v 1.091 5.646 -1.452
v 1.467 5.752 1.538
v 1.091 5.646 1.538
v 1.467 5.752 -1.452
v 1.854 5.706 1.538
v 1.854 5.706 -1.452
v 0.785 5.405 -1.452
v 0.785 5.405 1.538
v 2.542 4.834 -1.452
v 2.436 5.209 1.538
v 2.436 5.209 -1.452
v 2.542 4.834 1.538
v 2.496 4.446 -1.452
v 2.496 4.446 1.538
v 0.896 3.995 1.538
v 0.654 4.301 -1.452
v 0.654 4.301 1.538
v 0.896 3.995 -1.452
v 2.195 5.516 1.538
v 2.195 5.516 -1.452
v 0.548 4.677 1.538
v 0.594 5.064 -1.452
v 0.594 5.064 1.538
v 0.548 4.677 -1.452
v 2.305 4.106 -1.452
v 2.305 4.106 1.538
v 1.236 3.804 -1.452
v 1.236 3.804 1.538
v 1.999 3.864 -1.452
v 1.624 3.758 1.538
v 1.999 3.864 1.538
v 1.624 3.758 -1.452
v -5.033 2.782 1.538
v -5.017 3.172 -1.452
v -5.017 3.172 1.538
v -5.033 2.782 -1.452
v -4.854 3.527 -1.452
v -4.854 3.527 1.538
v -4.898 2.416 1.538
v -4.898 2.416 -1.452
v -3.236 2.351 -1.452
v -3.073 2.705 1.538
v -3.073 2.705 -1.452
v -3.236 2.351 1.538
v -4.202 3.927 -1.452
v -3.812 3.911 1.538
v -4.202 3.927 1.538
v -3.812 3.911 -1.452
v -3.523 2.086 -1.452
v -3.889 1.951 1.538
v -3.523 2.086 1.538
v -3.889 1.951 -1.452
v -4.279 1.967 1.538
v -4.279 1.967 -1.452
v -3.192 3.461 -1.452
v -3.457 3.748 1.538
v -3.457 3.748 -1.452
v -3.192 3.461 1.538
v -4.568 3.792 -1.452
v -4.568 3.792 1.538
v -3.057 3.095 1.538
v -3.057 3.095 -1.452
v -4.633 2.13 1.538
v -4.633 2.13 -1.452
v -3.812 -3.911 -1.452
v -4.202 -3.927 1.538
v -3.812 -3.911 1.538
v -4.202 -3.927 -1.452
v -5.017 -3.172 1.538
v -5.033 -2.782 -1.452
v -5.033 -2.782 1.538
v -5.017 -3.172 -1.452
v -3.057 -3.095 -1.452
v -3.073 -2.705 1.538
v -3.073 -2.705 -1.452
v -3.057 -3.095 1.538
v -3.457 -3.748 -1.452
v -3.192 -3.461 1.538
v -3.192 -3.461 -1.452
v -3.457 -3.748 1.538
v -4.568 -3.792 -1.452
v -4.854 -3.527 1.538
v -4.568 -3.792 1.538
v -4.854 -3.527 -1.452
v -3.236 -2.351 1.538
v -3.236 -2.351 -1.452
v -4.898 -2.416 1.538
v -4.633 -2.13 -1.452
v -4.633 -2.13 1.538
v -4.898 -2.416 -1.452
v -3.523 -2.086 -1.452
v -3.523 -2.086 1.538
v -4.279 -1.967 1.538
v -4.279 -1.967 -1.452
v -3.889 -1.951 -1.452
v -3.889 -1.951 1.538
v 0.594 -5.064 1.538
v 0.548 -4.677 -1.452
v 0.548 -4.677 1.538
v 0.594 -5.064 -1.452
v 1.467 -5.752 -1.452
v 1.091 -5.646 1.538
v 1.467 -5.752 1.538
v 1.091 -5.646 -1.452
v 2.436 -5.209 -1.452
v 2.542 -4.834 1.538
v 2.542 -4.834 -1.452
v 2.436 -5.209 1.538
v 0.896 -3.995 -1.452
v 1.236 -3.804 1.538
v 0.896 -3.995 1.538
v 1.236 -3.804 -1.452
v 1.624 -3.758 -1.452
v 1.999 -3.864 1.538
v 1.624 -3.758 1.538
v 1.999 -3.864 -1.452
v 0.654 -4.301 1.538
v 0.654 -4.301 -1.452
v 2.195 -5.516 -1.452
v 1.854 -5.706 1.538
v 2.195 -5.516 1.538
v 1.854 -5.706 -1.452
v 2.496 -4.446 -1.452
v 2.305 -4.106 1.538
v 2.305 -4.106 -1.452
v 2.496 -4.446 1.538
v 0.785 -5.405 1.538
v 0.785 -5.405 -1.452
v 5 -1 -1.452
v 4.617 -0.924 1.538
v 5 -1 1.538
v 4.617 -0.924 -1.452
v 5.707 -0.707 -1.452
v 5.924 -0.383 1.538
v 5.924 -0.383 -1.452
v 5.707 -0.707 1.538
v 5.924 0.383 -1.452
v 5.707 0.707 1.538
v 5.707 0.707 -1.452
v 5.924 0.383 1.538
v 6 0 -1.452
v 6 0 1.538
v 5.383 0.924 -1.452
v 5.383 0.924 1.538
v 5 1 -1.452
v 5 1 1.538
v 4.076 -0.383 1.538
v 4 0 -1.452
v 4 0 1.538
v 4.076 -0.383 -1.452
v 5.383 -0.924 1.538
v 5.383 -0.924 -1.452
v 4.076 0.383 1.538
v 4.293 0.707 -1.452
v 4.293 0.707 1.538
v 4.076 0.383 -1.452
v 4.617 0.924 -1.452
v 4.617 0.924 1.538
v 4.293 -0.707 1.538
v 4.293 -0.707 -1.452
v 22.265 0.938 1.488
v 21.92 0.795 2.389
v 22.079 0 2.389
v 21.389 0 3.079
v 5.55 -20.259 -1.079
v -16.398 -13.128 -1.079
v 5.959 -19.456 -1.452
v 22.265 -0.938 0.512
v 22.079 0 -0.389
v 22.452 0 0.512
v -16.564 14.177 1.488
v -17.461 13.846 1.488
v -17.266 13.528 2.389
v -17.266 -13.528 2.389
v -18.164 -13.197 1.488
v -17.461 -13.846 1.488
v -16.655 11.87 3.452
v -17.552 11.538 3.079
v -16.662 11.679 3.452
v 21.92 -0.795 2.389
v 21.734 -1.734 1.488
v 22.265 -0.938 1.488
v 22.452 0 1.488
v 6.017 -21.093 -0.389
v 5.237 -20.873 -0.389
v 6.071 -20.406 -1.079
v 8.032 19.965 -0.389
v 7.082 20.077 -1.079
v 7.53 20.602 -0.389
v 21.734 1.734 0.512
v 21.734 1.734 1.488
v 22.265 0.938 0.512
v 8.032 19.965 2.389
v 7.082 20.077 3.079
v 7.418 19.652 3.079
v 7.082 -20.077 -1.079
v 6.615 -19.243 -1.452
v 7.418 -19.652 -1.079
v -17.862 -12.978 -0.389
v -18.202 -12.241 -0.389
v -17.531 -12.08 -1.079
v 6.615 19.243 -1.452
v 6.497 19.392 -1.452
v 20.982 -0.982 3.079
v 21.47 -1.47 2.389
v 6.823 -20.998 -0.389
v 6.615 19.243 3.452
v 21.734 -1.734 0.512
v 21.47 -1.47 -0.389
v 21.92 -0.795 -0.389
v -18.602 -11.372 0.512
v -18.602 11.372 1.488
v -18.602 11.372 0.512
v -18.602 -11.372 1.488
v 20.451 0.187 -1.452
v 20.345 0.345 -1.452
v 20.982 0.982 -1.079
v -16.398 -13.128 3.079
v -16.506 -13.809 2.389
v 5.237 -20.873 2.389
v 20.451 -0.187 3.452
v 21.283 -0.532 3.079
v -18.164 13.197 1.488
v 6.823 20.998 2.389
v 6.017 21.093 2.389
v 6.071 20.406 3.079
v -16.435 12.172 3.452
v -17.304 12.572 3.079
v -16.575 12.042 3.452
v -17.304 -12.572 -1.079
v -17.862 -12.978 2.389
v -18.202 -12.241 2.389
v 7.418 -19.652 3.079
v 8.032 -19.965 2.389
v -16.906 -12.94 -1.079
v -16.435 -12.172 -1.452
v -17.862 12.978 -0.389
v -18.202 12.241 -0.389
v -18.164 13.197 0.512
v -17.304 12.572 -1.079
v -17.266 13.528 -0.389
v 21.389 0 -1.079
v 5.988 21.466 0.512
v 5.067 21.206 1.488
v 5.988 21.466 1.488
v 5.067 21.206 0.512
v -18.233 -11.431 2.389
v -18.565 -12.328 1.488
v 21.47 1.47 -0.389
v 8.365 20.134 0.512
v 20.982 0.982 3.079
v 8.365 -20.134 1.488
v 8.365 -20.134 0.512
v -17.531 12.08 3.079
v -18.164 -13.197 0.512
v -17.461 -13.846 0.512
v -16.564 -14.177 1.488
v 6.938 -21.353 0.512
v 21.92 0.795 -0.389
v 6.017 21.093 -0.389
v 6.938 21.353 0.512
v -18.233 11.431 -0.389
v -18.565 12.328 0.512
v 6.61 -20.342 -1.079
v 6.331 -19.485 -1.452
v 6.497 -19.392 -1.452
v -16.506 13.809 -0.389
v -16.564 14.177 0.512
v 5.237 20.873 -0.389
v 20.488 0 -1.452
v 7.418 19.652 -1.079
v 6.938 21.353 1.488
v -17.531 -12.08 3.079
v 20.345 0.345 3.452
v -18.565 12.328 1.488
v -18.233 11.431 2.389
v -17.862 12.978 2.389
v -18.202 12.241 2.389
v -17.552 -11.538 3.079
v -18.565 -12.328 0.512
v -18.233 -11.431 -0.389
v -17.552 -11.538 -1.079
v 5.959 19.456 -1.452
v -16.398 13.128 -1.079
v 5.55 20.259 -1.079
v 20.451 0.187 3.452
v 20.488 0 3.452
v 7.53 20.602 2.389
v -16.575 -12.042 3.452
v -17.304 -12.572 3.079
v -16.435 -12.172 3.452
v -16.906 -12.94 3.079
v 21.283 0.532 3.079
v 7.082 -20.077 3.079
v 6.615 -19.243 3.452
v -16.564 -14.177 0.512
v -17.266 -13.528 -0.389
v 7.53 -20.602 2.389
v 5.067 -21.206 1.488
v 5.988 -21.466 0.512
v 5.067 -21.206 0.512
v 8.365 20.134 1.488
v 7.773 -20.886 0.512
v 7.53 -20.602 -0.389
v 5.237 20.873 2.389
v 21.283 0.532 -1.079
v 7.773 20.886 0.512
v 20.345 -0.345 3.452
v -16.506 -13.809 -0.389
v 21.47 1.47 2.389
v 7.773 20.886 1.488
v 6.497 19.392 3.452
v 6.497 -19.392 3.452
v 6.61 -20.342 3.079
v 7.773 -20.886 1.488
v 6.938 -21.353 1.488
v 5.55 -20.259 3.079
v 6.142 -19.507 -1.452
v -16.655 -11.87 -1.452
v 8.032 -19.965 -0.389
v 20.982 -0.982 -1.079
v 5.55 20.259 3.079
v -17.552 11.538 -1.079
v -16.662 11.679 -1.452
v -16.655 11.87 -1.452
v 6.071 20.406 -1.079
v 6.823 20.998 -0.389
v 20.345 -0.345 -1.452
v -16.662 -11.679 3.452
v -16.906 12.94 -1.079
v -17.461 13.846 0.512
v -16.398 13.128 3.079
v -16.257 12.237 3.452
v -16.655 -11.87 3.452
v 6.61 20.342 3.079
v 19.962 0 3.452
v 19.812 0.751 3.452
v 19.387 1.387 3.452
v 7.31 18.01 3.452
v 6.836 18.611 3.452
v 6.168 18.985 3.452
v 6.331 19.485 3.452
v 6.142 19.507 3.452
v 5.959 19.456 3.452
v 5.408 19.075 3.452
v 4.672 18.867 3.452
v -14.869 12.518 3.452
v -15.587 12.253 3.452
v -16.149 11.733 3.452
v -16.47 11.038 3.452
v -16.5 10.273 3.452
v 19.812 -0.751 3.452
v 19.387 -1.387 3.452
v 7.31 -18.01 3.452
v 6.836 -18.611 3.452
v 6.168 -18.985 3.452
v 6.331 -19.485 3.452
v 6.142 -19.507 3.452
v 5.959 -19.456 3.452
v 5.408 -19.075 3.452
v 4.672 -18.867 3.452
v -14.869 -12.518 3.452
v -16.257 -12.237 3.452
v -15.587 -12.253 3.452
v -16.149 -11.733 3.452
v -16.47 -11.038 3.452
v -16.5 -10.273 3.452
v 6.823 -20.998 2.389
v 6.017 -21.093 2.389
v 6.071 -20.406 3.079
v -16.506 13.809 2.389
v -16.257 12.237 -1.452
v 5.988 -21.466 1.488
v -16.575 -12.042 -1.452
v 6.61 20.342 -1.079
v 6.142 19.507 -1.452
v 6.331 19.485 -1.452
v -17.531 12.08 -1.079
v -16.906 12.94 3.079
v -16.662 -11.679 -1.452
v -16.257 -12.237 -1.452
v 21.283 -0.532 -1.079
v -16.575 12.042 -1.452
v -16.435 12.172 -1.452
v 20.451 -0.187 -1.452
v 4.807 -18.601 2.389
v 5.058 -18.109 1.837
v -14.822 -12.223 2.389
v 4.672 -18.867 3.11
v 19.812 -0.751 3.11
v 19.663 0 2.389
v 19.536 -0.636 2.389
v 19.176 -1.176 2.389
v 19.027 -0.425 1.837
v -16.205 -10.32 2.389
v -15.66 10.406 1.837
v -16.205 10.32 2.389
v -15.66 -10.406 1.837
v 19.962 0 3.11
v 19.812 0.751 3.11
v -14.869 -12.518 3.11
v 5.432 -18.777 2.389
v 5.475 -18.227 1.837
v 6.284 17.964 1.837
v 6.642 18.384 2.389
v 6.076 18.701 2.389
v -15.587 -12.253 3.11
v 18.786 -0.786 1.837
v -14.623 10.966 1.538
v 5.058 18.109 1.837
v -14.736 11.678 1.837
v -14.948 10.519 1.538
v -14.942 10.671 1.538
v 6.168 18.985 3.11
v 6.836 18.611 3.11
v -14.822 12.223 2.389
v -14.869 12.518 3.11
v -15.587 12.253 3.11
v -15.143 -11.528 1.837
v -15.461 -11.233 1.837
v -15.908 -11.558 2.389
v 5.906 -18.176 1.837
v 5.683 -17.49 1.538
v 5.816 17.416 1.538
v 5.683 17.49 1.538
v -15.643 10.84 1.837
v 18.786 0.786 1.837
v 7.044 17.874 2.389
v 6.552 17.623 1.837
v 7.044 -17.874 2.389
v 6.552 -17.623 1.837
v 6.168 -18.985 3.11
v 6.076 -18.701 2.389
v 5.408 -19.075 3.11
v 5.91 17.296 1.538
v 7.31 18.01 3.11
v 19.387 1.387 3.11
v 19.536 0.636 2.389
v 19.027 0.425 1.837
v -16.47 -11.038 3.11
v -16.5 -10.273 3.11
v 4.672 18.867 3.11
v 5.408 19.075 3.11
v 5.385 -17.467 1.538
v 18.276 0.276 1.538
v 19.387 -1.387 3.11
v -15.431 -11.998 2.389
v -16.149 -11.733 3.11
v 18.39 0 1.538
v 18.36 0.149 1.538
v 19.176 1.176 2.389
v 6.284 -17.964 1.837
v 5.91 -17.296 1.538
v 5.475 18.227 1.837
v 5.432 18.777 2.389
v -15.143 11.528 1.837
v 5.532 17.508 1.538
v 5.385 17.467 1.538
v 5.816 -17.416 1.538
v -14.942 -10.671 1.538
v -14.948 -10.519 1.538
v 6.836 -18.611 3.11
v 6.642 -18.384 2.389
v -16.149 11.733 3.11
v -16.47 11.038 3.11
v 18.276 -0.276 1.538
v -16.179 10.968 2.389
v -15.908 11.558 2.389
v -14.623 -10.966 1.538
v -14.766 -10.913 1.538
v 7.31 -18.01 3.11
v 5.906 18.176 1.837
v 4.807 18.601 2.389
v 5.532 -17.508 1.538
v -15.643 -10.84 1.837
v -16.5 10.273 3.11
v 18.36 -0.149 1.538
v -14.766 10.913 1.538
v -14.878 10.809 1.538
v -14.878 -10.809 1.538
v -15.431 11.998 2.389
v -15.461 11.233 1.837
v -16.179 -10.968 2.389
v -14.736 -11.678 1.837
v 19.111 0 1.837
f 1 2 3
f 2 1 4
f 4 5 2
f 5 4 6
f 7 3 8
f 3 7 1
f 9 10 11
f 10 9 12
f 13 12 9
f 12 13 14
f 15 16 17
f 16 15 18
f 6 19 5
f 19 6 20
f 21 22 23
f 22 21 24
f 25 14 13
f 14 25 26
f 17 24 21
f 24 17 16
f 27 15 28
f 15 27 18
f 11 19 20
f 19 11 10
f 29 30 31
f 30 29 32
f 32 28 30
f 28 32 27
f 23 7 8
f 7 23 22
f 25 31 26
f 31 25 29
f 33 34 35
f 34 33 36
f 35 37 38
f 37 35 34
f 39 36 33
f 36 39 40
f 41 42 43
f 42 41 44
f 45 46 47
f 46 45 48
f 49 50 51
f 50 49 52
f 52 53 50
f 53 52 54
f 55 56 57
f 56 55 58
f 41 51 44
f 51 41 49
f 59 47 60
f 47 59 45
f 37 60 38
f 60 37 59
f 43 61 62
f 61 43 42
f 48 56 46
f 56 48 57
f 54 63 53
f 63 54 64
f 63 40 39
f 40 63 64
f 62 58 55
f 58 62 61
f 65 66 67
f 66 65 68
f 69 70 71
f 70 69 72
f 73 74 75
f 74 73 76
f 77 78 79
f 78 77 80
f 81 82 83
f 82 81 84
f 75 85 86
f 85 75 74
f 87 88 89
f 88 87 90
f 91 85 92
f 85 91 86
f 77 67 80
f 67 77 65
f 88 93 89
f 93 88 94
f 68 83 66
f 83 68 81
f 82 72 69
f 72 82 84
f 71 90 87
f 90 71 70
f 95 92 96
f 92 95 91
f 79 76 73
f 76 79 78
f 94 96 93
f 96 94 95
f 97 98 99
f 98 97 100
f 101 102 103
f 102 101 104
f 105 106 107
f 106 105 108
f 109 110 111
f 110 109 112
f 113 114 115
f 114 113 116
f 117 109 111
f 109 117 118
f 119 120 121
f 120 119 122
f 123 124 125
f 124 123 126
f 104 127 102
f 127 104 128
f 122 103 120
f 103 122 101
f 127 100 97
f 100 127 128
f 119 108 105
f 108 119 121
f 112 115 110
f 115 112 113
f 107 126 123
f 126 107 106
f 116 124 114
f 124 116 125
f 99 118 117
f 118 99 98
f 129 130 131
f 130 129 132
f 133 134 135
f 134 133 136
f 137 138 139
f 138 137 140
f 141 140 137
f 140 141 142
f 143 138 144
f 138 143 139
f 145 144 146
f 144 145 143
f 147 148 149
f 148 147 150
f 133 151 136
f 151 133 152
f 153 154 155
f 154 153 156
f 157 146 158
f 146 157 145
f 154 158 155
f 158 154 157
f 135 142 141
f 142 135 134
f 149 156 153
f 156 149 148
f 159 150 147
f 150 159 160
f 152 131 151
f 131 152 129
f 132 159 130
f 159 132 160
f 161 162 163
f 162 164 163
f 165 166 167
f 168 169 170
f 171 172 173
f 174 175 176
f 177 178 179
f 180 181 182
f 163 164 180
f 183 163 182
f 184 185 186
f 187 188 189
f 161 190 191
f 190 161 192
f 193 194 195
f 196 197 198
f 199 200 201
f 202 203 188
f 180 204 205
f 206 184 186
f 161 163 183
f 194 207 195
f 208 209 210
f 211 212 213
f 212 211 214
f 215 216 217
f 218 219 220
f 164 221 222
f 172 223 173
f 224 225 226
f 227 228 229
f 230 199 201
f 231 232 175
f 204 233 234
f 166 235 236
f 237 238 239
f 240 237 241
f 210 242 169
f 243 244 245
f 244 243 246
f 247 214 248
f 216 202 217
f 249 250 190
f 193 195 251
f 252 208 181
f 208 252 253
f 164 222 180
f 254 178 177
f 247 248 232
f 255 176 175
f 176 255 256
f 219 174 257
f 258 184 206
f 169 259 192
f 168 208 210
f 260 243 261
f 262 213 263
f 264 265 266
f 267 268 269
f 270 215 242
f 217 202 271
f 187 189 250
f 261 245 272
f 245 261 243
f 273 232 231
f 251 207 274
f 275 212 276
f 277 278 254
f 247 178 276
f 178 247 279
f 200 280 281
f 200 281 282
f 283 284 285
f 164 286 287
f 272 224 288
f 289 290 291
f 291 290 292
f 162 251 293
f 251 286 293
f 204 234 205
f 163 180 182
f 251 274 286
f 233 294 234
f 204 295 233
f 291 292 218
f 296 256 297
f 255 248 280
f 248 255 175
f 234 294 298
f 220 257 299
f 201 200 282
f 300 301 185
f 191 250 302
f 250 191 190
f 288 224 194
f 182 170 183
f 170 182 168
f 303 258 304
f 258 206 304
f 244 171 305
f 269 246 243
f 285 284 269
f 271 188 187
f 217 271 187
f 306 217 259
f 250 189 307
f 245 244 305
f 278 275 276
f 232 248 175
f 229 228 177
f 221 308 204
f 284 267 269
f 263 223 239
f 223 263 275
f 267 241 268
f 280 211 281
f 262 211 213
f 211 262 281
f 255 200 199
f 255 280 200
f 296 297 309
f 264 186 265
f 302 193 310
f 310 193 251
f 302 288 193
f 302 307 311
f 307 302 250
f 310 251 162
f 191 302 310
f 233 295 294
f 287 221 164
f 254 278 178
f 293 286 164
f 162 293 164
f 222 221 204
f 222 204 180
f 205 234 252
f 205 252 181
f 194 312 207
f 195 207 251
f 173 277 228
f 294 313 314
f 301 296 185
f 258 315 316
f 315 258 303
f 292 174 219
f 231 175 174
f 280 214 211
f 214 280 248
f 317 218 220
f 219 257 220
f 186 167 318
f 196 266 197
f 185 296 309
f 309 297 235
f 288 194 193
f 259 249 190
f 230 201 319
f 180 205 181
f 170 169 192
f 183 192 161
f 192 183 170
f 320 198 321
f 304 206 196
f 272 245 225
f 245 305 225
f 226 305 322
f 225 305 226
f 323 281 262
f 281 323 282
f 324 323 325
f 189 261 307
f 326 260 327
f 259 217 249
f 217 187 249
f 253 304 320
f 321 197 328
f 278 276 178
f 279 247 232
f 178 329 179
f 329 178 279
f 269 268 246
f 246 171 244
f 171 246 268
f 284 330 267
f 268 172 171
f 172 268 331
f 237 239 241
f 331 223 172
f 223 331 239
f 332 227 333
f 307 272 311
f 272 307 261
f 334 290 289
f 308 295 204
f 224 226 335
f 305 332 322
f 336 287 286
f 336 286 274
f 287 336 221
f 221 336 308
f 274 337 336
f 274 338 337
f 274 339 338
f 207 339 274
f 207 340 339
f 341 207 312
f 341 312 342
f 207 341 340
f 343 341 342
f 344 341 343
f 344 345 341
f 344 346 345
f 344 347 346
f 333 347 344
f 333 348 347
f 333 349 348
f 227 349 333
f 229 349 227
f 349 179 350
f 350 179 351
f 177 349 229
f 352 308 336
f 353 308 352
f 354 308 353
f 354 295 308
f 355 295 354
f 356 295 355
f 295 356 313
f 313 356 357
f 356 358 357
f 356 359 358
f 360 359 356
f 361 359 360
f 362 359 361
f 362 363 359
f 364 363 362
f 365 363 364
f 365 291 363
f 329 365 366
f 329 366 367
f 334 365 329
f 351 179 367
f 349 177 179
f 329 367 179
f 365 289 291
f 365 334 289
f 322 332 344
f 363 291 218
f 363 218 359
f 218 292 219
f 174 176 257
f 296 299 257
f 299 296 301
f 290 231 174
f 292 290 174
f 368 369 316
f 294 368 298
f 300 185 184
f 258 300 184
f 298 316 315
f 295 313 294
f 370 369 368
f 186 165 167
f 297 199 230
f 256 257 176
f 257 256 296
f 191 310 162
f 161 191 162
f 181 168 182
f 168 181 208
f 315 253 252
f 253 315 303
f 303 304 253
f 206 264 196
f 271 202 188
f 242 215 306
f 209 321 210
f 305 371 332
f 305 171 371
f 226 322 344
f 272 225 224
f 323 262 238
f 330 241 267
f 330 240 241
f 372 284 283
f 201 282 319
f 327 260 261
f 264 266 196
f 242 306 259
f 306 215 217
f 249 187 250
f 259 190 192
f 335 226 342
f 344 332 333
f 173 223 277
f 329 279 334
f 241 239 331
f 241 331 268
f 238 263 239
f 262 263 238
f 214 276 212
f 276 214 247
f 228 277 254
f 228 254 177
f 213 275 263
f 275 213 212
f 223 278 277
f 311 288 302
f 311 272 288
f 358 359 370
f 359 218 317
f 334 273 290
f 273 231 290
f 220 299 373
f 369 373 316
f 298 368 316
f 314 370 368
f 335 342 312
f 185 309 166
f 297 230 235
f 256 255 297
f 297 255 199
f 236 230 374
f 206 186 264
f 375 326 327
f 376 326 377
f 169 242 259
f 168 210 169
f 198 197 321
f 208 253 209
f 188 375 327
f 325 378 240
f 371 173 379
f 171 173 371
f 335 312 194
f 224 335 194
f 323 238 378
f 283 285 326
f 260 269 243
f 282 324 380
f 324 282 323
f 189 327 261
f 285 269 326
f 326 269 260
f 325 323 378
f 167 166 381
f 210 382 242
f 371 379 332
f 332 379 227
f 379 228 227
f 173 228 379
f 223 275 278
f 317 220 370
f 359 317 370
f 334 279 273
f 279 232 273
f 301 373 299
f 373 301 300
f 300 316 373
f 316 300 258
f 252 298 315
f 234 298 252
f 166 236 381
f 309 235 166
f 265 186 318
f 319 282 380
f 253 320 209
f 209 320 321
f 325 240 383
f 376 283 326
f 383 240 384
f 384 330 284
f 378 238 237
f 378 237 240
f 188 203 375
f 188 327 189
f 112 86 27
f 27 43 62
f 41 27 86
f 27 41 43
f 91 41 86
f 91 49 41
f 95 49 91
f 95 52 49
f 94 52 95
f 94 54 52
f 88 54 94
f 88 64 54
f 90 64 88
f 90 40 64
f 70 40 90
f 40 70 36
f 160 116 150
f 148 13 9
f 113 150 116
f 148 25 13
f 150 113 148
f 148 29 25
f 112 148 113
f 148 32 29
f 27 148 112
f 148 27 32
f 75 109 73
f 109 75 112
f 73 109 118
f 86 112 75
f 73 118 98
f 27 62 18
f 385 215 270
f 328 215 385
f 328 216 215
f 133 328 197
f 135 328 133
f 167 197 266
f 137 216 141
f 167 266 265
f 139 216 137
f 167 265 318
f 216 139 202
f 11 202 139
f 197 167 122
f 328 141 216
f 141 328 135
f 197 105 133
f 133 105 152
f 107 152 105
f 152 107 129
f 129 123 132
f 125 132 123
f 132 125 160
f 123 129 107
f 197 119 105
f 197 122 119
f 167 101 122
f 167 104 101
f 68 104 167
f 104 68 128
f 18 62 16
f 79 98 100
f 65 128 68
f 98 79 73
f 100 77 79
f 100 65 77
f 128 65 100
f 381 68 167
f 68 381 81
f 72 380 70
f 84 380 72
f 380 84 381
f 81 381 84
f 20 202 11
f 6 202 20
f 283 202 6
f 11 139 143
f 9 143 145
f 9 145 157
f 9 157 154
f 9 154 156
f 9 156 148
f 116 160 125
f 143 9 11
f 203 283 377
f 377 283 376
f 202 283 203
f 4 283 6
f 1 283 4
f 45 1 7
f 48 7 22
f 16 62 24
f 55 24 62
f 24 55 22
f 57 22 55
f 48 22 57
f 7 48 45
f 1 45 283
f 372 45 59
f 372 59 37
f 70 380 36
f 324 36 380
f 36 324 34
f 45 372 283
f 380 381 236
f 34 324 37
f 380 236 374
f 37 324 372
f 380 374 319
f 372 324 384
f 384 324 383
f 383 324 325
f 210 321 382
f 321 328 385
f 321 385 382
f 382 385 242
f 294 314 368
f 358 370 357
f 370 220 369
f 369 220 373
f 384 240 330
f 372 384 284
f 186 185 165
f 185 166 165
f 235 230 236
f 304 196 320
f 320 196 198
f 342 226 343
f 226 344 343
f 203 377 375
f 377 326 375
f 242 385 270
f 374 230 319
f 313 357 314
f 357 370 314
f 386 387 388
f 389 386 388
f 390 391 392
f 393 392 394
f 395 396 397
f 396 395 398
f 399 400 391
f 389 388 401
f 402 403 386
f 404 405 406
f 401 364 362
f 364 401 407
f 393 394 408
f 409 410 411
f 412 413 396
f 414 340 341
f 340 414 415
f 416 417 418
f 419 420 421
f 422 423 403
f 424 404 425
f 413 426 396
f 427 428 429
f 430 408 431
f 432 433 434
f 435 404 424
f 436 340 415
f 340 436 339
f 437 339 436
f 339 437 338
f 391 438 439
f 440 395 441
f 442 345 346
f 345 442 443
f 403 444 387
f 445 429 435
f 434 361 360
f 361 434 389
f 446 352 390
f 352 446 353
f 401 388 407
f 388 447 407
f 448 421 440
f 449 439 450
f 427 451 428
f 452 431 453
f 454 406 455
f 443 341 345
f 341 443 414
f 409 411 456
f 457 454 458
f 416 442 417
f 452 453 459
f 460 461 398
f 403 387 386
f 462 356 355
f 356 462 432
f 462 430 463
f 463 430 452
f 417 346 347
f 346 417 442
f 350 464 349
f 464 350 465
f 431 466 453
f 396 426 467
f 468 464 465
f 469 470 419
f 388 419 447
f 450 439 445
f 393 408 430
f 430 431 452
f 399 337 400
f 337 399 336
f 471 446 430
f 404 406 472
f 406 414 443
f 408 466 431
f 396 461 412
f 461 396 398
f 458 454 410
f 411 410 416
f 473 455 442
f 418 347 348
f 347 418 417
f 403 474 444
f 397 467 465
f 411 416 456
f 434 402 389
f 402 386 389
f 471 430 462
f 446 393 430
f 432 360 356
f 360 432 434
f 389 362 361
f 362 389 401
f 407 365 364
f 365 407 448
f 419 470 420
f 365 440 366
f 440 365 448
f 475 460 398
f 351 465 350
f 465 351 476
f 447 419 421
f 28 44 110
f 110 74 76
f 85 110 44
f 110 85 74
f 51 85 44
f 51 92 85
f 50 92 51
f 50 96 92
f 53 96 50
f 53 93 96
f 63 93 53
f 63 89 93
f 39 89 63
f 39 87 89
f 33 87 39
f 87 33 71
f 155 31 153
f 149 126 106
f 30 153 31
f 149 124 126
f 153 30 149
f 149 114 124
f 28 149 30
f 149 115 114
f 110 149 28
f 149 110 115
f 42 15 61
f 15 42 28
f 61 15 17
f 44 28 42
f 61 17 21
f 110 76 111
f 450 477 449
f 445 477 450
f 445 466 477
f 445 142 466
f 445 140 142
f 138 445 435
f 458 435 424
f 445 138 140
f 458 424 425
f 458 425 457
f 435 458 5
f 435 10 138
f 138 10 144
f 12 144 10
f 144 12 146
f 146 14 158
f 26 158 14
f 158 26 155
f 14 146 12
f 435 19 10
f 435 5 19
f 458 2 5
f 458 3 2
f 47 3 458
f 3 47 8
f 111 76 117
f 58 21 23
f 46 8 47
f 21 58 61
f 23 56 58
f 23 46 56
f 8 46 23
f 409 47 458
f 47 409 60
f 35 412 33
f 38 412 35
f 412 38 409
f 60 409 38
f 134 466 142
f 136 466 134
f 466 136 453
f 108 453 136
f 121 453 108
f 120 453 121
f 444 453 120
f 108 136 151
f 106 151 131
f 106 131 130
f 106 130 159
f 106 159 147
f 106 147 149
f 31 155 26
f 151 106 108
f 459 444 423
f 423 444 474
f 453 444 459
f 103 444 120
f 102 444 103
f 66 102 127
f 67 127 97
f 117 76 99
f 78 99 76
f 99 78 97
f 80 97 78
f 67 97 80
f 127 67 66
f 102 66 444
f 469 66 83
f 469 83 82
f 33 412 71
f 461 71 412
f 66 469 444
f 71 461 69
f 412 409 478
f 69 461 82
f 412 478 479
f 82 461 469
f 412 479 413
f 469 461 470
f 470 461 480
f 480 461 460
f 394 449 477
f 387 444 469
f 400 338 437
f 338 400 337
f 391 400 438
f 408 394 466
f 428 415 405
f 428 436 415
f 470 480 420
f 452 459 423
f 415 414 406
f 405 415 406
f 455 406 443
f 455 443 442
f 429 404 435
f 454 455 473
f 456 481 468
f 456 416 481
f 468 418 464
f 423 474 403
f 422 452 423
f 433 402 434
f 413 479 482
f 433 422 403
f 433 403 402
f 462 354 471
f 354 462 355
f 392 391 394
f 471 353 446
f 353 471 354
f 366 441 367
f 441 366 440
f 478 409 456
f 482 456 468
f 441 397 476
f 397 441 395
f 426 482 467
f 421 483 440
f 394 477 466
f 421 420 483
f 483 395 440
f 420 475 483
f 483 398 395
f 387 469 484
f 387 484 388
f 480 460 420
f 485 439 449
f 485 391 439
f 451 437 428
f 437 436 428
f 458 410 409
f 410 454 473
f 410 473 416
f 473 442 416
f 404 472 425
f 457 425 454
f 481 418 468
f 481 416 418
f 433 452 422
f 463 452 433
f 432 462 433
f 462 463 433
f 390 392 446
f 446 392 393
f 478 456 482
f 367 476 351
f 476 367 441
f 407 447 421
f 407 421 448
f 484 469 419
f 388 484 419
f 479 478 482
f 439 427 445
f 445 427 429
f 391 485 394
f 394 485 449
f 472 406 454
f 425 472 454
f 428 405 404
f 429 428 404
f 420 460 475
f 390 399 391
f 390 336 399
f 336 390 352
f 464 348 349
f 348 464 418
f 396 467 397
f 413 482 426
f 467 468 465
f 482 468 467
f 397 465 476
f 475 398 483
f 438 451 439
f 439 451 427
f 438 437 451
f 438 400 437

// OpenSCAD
// Générateurs de boutons
// Par Vanlindt Marc (www.vanlindt.be)
/* [Variables générales] */

// Choix du type de bouton
TypeDeBouton="lissé";//[forme,lissé]


// Exprimé en mm.
HauteurDuBouton=3;

// Exprimé en mm.
RayonDuBouton=20;

// Nombre de faces au boutons :
Forme=5;

/* [Rebord] */
// Rebord
Rebord="true";//[true,false]

// Epaisseur du rebord (en mm)
EpaisseurDuRebord=2;

// Hauteur du rebord (en mm)
HauteurDuRebord=2;

/* [Trous] */
// Nombre de trous 
NombreDeTrous=5;

// Distance d'un trou par rapport au centre (en mm)
DistanceTrou=5;

// Diamètre d'un trou (en mm)
DiametreTrou=2;

// Rotation des trous
RotationsDesTrous=0;//[0:360]

/* [Lissage] */
QualiteDuLissage=2;//[1:4]


bouton();



module bouton()
{
if (TypeDeBouton=="forme")
{    
    difference()
    {
	if (Rebord=="true")
	{
            difference()
            {
                union()
		{
                    cylinder(r=RayonDuBouton,h=HauteurDuBouton,center=true,$fn=Forme);
                    difference()
                    {
                        cylinder(r=RayonDuBouton,h=HauteurDuBouton+HauteurDuRebord,center=true,$fn=Forme);
			cylinder(r=RayonDuBouton-EpaisseurDuRebord,h=HauteurDuBouton+HauteurDuRebord*2,center=true,$fn=Forme);
                    }
		}
                rotate([0,0,RotationsDesTrous])
                for (i=[1:NombreDeTrous])	
                {
                    rotate([0,0,i*360/NombreDeTrous])
                    translate([DistanceTrou,0,0])
                    cylinder(r=DiametreTrou/2,h=HauteurDuBouton*20,$fn=16,center=true);
                }
            }
        }
       	if (Rebord=="false")
	{
            difference()
            {
                cylinder(r=RayonDuBouton,h=HauteurDuBouton,center=true,$fn=Forme);
                rotate([0,0,RotationsDesTrous])
                for (i=[1:NombreDeTrous])	
                {
                    rotate([0,0,i*360/NombreDeTrous])
                    translate([DistanceTrou,0,0])
                    cylinder(r=DiametreTrou/2,h=HauteurDuBouton*20,$fn=16,center=true);
                }
            }
        }
        translate([0,0,-HauteurDuBouton])
        cube([RayonDuBouton*2,RayonDuBouton*2,HauteurDuBouton],center=true);
    }
}
if (TypeDeBouton=="lissé")
{    
    difference()
    {
	if (Rebord=="true")
	{
            difference()
            {
                translate([0,0,HauteurDuRebord/2])
                hull()
                {
                for (i=[1:Forme])
                {
                    rotate([0,0,i*360/Forme])
                    translate([RayonDuBouton,0,0])
                    sphere(r=HauteurDuBouton/2+HauteurDuRebord/2,$fn=8*QualiteDuLissage);
                }
                }
                
                rotate([0,0,RotationsDesTrous])
                for (i=[1:NombreDeTrous])	
                {
                    rotate([0,0,i*360/NombreDeTrous])
                    translate([DistanceTrou,0,0])
                    cylinder(r=DiametreTrou/2,h=HauteurDuBouton*20,$fn=8*QualiteDuLissage,center=true);
                }
                translate([0,0,HauteurDuBouton/2+HauteurDuRebord])
               hull()
                {
                    for (i=[1:Forme])
                    {
                        rotate([0,0,i*360/Forme])
                        translate([RayonDuBouton-EpaisseurDuRebord,0,0])
                        sphere(r=HauteurDuRebord,$fn=8*QualiteDuLissage);
                
                    }
                }
            }            
            
        }  
       	if (Rebord=="false")
	{
            difference()
            {
                hull()
                {
                for (i=[1:Forme])
                {
                    rotate([0,0,i*360/Forme])
                    translate([RayonDuBouton,0,0])
                    sphere(r=HauteurDuBouton/2,$fn=8*QualiteDuLissage);
                }
                }
                
                rotate([0,0,RotationsDesTrous])
                for (i=[1:NombreDeTrous])	
                {
                    rotate([0,0,i*360/NombreDeTrous])
                    translate([DistanceTrou,0,0])
                    cylinder(r=DiametreTrou/2,h=HauteurDuBouton*20,$fn=8*QualiteDuLissage,center=true);
                }
            }
        }

    }

}

}
